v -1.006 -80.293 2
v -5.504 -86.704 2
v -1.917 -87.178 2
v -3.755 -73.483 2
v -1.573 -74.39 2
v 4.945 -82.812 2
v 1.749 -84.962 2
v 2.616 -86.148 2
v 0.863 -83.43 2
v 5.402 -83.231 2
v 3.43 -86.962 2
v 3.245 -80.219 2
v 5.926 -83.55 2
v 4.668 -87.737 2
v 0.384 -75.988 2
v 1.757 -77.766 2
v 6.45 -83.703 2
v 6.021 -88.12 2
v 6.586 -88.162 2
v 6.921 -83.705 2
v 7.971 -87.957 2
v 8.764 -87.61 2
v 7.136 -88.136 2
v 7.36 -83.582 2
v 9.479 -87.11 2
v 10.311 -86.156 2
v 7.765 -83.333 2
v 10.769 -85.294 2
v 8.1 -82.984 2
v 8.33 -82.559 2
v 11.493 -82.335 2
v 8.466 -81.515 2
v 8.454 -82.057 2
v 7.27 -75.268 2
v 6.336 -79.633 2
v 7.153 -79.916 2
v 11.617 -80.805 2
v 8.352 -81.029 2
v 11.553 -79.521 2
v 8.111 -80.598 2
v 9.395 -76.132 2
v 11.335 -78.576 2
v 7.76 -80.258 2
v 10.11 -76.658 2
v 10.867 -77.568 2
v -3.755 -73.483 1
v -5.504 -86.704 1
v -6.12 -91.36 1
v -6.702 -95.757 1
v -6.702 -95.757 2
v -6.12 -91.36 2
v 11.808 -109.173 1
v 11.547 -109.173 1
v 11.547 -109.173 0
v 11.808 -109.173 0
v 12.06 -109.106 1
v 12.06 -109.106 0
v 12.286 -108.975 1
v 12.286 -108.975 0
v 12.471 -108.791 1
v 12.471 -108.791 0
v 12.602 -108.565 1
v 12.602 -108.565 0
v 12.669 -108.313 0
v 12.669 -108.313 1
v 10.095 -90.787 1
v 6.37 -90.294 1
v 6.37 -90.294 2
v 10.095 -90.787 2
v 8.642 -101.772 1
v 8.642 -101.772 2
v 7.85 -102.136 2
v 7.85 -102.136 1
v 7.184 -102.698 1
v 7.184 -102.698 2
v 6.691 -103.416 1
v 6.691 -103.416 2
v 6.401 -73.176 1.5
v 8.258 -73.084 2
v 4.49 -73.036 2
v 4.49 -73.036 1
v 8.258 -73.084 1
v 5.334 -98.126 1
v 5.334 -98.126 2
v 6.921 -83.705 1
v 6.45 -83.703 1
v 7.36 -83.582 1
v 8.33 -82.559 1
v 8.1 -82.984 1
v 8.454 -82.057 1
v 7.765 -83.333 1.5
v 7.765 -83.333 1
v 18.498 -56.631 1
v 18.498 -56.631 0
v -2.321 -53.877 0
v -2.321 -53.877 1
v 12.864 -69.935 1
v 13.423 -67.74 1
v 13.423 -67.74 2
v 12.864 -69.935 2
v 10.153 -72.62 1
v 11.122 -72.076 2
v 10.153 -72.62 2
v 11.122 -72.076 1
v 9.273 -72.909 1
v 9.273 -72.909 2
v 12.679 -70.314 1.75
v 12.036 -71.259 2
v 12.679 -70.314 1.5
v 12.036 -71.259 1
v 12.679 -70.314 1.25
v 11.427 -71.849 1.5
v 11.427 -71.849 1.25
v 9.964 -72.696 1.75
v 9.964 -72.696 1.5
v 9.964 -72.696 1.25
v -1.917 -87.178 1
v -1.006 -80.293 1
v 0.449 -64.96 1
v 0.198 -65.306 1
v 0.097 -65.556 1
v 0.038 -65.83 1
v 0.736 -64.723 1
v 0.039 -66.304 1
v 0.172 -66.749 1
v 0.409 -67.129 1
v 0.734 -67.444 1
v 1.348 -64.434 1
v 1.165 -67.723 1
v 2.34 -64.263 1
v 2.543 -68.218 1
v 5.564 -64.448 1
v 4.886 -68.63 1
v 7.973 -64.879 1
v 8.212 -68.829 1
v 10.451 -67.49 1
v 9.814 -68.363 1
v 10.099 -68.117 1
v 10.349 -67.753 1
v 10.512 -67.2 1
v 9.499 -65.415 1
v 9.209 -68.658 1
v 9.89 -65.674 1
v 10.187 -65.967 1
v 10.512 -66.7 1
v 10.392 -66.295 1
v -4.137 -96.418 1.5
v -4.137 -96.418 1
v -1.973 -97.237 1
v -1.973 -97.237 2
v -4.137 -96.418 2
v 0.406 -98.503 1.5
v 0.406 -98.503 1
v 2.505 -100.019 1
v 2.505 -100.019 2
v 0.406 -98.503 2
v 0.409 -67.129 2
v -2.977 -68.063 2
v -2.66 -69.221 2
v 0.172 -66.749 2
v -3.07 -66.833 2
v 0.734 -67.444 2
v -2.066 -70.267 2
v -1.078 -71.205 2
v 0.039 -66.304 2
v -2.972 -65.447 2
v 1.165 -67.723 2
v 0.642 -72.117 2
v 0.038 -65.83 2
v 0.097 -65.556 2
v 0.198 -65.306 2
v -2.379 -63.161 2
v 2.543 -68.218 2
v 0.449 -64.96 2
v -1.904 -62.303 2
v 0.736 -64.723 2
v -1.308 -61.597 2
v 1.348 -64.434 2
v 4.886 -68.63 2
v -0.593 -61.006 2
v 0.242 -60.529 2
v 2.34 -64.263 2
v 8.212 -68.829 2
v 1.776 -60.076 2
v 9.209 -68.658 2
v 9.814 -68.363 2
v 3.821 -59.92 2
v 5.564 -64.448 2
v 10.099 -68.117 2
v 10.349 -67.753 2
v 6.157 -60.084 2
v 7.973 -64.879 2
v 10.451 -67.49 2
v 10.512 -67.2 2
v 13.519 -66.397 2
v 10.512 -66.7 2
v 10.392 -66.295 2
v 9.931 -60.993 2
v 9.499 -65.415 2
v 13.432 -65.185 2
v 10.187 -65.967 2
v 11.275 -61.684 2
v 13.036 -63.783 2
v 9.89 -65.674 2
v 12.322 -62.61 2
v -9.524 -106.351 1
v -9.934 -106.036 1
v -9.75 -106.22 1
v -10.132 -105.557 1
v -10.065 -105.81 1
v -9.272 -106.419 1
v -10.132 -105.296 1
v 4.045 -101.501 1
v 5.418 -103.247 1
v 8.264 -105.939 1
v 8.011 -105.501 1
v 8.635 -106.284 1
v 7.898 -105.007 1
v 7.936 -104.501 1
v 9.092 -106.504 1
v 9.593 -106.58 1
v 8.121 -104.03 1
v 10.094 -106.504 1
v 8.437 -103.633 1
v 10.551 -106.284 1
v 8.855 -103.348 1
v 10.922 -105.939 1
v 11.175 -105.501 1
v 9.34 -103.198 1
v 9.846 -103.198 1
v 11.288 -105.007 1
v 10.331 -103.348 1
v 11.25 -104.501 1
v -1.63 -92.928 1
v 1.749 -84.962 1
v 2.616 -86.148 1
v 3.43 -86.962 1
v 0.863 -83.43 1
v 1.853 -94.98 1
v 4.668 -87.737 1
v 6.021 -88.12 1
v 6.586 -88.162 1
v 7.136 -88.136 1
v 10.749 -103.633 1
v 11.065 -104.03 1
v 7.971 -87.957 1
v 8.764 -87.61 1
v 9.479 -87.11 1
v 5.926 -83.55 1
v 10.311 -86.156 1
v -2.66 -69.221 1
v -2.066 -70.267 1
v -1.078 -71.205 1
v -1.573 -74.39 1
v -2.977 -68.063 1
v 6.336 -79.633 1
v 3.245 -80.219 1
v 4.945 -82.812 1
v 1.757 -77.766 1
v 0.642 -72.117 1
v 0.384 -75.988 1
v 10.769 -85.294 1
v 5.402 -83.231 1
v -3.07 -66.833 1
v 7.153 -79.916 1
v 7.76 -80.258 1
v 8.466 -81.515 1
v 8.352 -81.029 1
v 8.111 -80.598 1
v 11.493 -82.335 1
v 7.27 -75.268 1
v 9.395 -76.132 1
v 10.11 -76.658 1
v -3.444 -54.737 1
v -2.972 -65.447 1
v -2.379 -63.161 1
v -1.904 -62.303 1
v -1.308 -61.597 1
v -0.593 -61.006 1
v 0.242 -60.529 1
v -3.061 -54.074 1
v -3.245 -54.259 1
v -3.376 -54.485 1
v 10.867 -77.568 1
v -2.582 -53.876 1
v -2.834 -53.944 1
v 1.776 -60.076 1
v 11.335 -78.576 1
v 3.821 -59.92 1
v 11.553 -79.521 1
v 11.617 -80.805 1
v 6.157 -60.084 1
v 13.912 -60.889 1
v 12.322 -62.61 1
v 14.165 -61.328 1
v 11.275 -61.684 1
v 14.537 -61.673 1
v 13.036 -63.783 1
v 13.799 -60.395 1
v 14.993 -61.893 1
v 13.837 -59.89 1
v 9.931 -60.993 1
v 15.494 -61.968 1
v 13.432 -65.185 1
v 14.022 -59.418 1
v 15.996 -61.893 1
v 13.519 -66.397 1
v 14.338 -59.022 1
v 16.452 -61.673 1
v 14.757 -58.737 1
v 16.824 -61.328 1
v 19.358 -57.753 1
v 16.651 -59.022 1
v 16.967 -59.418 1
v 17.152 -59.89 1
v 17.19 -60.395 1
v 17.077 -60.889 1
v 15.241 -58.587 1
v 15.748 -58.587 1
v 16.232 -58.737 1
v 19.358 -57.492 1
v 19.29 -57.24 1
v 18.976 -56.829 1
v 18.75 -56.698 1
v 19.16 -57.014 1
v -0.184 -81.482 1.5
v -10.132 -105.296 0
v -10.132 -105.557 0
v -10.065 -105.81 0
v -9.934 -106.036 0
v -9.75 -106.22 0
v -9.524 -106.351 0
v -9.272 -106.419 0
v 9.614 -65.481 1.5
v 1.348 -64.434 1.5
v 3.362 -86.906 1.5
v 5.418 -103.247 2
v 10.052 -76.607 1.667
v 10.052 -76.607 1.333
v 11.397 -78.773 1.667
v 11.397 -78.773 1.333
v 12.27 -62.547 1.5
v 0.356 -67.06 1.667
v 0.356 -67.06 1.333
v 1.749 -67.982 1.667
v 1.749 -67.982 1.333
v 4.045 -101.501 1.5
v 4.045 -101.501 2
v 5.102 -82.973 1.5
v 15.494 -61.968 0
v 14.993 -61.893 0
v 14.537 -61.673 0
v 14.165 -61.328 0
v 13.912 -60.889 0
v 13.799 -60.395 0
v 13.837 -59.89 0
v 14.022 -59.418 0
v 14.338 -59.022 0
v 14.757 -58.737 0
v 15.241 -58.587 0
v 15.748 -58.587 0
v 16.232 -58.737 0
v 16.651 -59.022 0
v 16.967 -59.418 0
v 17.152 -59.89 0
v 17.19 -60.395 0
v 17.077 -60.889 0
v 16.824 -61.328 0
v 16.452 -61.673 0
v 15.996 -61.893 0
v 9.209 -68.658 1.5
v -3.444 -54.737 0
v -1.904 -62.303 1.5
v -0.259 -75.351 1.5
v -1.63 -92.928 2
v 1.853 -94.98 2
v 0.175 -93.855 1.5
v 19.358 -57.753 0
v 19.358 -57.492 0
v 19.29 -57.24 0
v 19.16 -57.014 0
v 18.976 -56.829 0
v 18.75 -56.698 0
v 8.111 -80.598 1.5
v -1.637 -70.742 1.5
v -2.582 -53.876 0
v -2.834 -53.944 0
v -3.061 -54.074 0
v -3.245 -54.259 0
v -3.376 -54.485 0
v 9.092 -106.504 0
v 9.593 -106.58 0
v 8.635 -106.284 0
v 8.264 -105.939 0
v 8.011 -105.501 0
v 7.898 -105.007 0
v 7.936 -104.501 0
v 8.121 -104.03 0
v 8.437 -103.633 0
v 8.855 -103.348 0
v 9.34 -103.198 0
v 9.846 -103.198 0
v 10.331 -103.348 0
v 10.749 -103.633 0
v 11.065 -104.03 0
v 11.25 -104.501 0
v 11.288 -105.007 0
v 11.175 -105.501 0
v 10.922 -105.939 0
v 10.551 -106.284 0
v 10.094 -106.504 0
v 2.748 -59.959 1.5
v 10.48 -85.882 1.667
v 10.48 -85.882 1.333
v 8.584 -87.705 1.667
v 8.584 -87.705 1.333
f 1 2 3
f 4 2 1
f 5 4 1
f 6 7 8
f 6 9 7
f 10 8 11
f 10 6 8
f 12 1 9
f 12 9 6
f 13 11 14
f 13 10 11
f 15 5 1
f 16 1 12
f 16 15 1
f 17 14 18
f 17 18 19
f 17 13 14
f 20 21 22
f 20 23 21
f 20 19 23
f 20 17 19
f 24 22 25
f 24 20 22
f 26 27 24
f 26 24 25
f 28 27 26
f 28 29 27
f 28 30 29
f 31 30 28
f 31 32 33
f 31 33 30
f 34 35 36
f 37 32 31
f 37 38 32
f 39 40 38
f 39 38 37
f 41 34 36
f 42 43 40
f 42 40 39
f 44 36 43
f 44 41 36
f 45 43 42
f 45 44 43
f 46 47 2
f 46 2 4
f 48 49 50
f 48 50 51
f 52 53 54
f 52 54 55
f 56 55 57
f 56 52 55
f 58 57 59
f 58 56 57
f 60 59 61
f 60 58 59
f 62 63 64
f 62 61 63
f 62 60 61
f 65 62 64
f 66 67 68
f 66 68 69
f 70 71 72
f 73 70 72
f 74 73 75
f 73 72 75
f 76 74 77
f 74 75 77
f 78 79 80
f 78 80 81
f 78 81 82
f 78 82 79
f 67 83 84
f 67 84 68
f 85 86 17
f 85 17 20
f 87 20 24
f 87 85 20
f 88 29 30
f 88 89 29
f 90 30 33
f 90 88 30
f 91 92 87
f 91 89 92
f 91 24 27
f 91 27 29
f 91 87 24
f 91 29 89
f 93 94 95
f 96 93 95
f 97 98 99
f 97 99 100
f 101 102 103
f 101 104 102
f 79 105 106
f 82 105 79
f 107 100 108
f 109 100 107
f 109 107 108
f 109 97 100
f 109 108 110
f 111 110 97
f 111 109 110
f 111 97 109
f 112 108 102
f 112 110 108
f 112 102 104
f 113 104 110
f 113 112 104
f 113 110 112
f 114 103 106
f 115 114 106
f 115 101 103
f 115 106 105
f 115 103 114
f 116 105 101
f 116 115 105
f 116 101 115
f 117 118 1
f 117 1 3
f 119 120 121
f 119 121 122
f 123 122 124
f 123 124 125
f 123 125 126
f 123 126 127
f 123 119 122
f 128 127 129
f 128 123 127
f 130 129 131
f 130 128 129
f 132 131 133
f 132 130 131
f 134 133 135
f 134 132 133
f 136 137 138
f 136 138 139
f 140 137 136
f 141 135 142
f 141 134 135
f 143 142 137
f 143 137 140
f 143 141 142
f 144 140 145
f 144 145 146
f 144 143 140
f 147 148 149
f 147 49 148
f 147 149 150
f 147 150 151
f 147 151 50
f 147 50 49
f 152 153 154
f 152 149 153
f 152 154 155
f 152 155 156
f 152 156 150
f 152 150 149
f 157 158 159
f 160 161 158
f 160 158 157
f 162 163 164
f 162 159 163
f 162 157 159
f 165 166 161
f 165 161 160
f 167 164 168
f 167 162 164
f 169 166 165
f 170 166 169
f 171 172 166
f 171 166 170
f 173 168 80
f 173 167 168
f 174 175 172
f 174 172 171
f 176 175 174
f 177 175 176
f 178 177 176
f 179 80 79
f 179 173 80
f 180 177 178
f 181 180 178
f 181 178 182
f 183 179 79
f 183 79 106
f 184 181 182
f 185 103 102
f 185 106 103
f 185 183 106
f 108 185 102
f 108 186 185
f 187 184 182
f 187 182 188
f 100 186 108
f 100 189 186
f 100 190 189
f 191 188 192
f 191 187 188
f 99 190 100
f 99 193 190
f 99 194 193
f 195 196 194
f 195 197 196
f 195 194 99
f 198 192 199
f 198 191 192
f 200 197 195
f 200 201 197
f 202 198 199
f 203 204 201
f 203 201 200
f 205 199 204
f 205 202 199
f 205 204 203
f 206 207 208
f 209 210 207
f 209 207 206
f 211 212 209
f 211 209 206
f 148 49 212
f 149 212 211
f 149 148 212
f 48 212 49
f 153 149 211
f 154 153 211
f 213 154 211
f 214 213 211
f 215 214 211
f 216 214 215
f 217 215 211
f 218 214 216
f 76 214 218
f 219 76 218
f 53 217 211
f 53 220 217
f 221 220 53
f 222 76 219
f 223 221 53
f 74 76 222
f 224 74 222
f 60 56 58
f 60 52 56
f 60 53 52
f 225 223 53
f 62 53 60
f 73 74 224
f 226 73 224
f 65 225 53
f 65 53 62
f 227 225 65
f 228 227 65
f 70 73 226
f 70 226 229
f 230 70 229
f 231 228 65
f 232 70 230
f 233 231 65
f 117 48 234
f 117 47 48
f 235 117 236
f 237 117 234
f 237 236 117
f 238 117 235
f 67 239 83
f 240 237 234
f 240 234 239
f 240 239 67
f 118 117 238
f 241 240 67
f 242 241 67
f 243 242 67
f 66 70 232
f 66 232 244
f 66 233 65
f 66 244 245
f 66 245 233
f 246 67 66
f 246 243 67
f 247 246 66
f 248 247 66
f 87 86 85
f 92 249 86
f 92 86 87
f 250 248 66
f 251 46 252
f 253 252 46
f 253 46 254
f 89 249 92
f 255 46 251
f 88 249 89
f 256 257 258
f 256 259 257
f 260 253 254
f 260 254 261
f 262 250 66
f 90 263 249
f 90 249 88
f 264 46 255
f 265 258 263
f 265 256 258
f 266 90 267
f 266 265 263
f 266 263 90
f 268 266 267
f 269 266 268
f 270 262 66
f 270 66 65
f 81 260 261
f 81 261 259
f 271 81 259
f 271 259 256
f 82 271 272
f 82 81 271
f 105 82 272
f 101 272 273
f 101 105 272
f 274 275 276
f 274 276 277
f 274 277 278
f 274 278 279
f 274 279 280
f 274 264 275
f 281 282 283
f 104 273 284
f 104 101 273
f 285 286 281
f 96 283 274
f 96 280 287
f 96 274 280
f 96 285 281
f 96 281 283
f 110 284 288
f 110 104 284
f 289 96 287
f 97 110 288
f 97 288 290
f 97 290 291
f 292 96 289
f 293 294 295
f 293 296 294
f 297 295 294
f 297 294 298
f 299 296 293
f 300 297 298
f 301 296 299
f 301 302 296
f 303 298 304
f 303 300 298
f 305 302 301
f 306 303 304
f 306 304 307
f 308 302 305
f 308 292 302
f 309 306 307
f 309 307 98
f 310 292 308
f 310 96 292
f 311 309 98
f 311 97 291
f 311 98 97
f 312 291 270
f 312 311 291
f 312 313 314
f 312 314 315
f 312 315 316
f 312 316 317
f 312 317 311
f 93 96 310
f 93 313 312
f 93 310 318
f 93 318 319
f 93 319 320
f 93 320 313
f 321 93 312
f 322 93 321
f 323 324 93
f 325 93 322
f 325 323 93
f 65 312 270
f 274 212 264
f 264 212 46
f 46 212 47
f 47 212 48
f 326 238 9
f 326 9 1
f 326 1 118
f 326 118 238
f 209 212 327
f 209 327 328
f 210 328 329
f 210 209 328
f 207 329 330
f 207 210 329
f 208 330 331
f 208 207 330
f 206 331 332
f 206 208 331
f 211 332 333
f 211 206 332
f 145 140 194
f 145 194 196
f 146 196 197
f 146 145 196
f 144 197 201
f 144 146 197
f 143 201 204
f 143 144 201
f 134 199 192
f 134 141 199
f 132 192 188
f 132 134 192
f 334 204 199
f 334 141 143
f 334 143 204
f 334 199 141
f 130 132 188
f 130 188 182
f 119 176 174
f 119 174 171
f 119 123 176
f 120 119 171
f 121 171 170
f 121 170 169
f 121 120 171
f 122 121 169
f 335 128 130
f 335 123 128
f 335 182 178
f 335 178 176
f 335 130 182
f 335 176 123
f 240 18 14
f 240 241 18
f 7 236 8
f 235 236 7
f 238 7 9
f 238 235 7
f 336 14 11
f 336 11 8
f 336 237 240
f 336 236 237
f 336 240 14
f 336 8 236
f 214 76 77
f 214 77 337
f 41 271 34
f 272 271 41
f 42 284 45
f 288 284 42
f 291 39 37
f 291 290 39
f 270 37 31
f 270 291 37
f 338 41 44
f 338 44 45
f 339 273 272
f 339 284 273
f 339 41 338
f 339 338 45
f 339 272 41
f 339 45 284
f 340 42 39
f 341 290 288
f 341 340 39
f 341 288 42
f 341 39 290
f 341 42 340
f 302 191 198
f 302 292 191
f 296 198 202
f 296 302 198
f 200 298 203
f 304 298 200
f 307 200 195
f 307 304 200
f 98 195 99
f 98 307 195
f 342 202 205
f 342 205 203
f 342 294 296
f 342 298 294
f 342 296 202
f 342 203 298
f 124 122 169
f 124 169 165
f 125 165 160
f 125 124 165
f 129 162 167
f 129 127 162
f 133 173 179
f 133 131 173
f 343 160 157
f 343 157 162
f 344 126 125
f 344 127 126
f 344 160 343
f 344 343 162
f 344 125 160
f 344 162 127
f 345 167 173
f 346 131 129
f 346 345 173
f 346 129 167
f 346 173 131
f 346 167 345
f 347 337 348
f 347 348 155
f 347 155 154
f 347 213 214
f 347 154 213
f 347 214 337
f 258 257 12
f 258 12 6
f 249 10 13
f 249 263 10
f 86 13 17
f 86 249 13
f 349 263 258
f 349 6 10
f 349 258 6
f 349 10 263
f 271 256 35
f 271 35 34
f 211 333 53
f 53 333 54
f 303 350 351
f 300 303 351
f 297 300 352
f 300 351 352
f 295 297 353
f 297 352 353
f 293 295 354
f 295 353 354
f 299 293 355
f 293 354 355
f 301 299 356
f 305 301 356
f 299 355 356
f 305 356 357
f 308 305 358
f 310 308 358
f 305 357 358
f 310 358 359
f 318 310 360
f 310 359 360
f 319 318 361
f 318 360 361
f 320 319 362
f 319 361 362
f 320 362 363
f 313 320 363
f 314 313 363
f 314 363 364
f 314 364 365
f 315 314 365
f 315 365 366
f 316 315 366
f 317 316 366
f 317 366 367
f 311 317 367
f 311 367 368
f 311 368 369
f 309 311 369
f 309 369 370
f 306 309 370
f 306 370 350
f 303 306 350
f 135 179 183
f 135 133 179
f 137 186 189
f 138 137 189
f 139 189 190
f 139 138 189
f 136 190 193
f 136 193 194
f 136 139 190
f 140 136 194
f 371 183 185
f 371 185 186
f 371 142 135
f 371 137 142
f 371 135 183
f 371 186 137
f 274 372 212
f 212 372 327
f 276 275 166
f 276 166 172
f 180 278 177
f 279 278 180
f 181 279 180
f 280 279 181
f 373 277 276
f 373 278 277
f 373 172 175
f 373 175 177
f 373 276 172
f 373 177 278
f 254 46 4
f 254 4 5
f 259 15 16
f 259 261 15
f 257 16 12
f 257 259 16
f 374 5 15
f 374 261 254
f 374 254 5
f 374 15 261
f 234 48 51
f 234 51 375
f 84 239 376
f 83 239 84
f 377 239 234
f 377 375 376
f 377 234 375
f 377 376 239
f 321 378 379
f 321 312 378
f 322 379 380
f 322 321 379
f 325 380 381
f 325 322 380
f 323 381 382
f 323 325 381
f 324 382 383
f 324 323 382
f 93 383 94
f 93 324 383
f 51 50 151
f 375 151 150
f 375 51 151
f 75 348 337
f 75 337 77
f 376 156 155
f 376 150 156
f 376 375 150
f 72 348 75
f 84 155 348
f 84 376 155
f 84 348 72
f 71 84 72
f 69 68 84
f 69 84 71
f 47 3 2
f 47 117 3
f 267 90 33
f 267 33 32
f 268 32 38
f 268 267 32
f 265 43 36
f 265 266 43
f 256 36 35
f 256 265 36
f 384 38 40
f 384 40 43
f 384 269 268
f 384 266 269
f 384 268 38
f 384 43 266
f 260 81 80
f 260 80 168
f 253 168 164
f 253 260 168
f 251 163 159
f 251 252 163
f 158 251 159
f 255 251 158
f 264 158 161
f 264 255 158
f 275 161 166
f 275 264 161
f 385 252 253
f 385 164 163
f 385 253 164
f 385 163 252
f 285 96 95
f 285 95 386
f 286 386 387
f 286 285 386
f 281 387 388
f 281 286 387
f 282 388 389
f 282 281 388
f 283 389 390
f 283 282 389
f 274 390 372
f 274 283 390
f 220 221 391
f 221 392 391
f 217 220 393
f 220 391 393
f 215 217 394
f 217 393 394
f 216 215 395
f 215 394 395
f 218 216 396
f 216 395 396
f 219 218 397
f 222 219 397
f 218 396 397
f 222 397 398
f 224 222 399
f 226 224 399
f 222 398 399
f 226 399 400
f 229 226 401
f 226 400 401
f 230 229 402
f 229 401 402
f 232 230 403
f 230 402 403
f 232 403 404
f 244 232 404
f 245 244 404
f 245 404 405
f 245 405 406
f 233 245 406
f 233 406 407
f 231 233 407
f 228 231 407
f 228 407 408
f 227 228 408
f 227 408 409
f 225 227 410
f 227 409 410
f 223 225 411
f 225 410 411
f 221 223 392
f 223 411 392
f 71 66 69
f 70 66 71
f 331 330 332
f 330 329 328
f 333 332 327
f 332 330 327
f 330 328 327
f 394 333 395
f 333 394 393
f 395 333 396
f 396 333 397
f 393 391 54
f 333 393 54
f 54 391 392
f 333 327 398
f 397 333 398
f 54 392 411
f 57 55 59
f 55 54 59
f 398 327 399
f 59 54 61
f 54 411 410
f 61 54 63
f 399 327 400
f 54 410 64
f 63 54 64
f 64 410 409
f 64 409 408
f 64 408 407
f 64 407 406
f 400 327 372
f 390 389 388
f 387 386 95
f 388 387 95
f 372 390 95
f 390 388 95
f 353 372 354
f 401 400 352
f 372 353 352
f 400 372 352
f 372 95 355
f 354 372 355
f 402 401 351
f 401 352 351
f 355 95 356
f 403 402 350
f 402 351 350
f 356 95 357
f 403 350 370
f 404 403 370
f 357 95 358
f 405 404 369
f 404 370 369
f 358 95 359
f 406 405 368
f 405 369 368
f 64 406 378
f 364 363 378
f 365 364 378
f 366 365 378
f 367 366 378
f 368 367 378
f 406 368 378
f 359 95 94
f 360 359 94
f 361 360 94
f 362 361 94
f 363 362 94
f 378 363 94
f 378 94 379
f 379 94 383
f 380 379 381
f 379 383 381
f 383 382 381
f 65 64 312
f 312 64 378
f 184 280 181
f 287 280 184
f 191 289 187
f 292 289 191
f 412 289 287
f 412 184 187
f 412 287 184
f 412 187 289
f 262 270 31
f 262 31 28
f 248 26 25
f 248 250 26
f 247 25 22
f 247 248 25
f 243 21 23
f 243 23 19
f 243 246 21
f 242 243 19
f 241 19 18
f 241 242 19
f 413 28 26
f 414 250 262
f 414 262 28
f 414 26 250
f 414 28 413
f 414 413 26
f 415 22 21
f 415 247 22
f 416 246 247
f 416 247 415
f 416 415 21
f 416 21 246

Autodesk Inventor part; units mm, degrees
ref_plane "YZ Plane" through (0, 0, 0) normal (1, 0, 0) x (0, 1, 0)
ref_plane "XZ Plane" through (0, 0, 0) normal (0, 1, 0) x (-1, 0, 0)
ref_plane "XY Plane" through (0, 0, 0) normal (0, 0, 1) x (1, 0, 0)
ref_plane "Work Plane1" through (6.35, -3.5793, 0) normal (0, 0, 1) x (0.9913632, -0.1311451, 0)
sketch "Sketch1" plane through (6.35, -3.5793, 0) normal (0, 0, 1) x (0.9913632, -0.1311451, 0)
  line L0 (9.4349, -35.1273) -> (9.1077, -32.6537) projected
  line L1 (9.1077, -32.6537) -> (11.809, -32.2963) projected
  line L2 (11.809, -32.2963) -> (11.8581, -32.8269) projected
  line L3 (11.8581, -32.8269) -> (12.0044, -33.5342) projected
  spline S0 degree 2 poles (12.0044, -33.5342) (12.2496, -34.5127) (12.9939, -35.3621) (13.7166, -35.5719) knots 0 0 0 1 2 2 2 projected
  line L4 (13.7166, -35.5719) -> (14.274, -35.6456) projected
  line L5 (14.274, -35.6456) -> (14.6409, -38.4193) projected
  line L6 (14.6409, -38.4193) -> (0.7619, -40.2553) projected
  line L7 (0.7619, -40.2553) -> (0.2443, -36.3431) projected
  line L8 (0.2443, -36.3431) -> (9.4349, -35.1273) projected
  line L9 (-0.9482, -27.3284) -> (-1.4726, -23.3645) projected
  line L10 (-1.4726, -23.3645) -> (12.4065, -21.5284) projected
  line L11 (12.4065, -21.5284) -> (13.1225, -26.9414) projected
  spline S1 degree 2 poles (13.1225, -26.9414) (13.3717, -28.825) (11.9849, -30.9988) (10.2534, -31.5228) knots 0 0 0 1 2 2 2 projected
  spline S2 degree 2 poles (10.2534, -31.5228) (9.6848, -31.6822) (9.2839, -31.7563) (9.1286, -31.7769) knots 0 0 0 1 2 2 2 projected
  spline S3 degree 2 poles (9.1286, -31.7769) (7.1725, -32.0356) (4.658, -29.904) (4.3718, -27.7409) knots 0 0 0 1 2 2 2 projected
  line L12 (4.3718, -27.7409) -> (4.2267, -26.6439) projected
  line L13 (4.2267, -26.6439) -> (-0.9482, -27.3284) projected
  line L14 (-4.2533, -2.344) -> (-4.7325, 1.2784) projected
  line L15 (-4.7325, 1.2784) -> (9.1465, 3.1145) projected
  line L16 (9.1465, 3.1145) -> (9.8448, -2.1639) projected
  line L17 (9.8448, -2.1639) -> (2.0845, -4.5596) projected
  line L18 (2.0845, -4.5596) -> (10.2008, -4.8549) projected
  line L19 (10.2008, -4.8549) -> (10.9018, -10.154) projected
  line L20 (10.9018, -10.154) -> (-2.9773, -11.99) projected
  line L21 (-2.9773, -11.99) -> (-3.4565, -8.3676) projected
  line L22 (-3.4565, -8.3676) -> (6.1067, -7.1025) projected
  line L23 (6.1067, -7.1025) -> (-3.6564, -6.8565) projected
  line L24 (-3.6564, -6.8565) -> (-4.0562, -3.8344) projected
  line L25 (-4.0562, -3.8344) -> (5.3099, -1.0789) projected
  line L26 (5.3099, -1.0789) -> (-4.2533, -2.344) projected
  line L27 (-6.2934, 13.0772) -> (-6.8178, 17.0412) projected
  line L28 (-6.8178, 17.0412) -> (7.0613, 18.8772) projected
  line L29 (7.0613, 18.8772) -> (7.7774, 13.4643) projected
  spline S4 degree 2 poles (7.7774, 13.4643) (8.0266, 11.5806) (6.6397, 9.4068) (4.9082, 8.8829) knots 0 0 0 1 2 2 2 projected
  spline S5 degree 2 poles (4.9082, 8.8829) (4.3396, 8.7234) (3.9387, 8.6493) (3.7835, 8.6288) knots 0 0 0 1 2 2 2 projected
  spline S6 degree 2 poles (3.7835, 8.6288) (1.8273, 8.37) (-0.6872, 10.5016) (-0.9734, 12.6647) knots 0 0 0 1 2 2 2 projected
  line L30 (-0.9734, 12.6647) -> (-1.1185, 13.7618) projected
  line L31 (-1.1185, 13.7618) -> (-6.2934, 13.0772) projected
  line L32 (-8.8852, 32.6694) -> (-9.4096, 36.6333) projected
  line L33 (-9.4096, 36.6333) -> (4.4695, 38.4694) projected
  line L34 (4.4695, 38.4694) -> (5.1856, 33.0564) projected
  spline S7 degree 2 poles (5.1856, 33.0564) (5.4348, 31.1728) (4.0479, 28.999) (2.3164, 28.475) knots 0 0 0 1 2 2 2 projected
  spline S8 degree 2 poles (2.3164, 28.475) (1.7478, 28.3156) (1.3469, 28.2415) (1.1917, 28.2209) knots 0 0 0 1 2 2 2 projected
  spline S9 degree 2 poles (1.1917, 28.2209) (-0.7645, 27.9622) (-3.279, 30.0938) (-3.5652, 32.2569) knots 0 0 0 1 2 2 2 projected
  line L35 (-3.5652, 32.2569) -> (-3.7103, 33.3539) projected
  line L36 (-3.7103, 33.3539) -> (-8.8852, 32.6694) projected
  line L37 (-6.9369, 17.9416) -> (-8.0596, 26.4284) projected
  line L38 (-8.0596, 26.4284) -> (5.8195, 28.2645) projected
  line L39 (5.8195, 28.2645) -> (6.923, 19.9225) projected
  line L40 (6.923, 19.9225) -> (3.7146, 19.4981) projected
  line L41 (3.7146, 19.4981) -> (3.1354, 23.8761) projected
  line L42 (3.1354, 23.8761) -> (1.0655, 23.6022) projected
  line L43 (1.0655, 23.6022) -> (1.609, 19.4934) projected
  line L44 (1.609, 19.4934) -> (-1.4649, 19.0867) projected
  line L45 (-1.4649, 19.0867) -> (-2.0084, 23.1956) projected
  line L46 (-2.0084, 23.1956) -> (-4.3268, 22.8889) projected
  line L47 (-4.3268, 22.8889) -> (-3.7284, 18.366) projected
  line L48 (-3.7284, 18.366) -> (-6.9369, 17.9416) projected
  line L49 (-2.3023, -17.0925) -> (-2.7993, -13.3355) projected
  line L50 (-2.7993, -13.3355) -> (11.0798, -11.4995) projected
  line L51 (11.0798, -11.4995) -> (11.5768, -15.2564) projected
  line L52 (11.5768, -15.2564) -> (4.8598, -16.145) projected
  line L53 (4.8598, -16.145) -> (8.406, -17.3187) projected
  line L54 (8.406, -17.3187) -> (8.9249, -21.2413) projected
  line L55 (8.9249, -21.2413) -> (4.2393, -19.0178) projected
  line L56 (4.2393, -19.0178) -> (-1.5205, -23.0022) projected
  line L57 (-1.5205, -23.0022) -> (-2.0504, -18.9968) projected
  line L58 (-2.0504, -18.9968) -> (1.2432, -16.9078) projected
  line L59 (1.2432, -16.9078) -> (0.4818, -16.7242) projected
  line L60 (0.4818, -16.7242) -> (-2.3023, -17.0925) projected
  line L61 (20, -51) -> (-3, -51)
  line L62 (-3, -51) -> (-3, -104)
  line L63 (-3, -104) -> (20, -104)
  line L64 (20, -104) -> (20, -51)
  circle A0 centre (16.3103, -49.711) radius 1.95 projected
  circle A1 centre (-20.0656, -79.7409) radius 1.95 projected
  circle A2 centre (-37.1145, 49.1363) radius 1.95 projected
  line L65 (11.0027, -81.1536) -> (12.4808, -77.5789) projected
  line L66 (7.1679, -81.6609) -> (11.0027, -81.1536) projected
  line L67 (4.8111, -78.5935) -> (7.1679, -81.6609) projected
  line L68 (6.2892, -75.0188) -> (4.8111, -78.5935) projected
  line L69 (10.124, -74.5115) -> (6.2892, -75.0188) projected
  line L70 (12.4808, -77.5789) -> (10.124, -74.5115) projected
  line L71 (2.8138, -48.7477) -> (1.3358, -52.3224) projected
  line L72 (6.6487, -48.2404) -> (2.8138, -48.7477) projected
  line L73 (9.0054, -51.3078) -> (6.6487, -48.2404) projected
  line L74 (7.5273, -54.8825) -> (9.0054, -51.3078) projected
  line L75 (3.6925, -55.3898) -> (7.5273, -54.8825) projected
  line L76 (1.3358, -52.3224) -> (3.6925, -55.3898) projected
  line L77 (9.7896, -71.9835) -> (11.2677, -68.4088) projected
  line L78 (5.9548, -72.4908) -> (9.7896, -71.9835) projected
  line L79 (3.598, -69.4234) -> (5.9548, -72.4908) projected
  line L80 (5.0761, -65.8487) -> (3.598, -69.4234) projected
  line L81 (8.9109, -65.3414) -> (5.0761, -65.8487) projected
  line L82 (11.2677, -68.4088) -> (8.9109, -65.3414) projected
  line L83 (8.5514, -92.1198) -> (7.0733, -95.6945) projected
  line L84 (12.3863, -91.6125) -> (8.5514, -92.1198) projected
  line L85 (14.743, -94.6799) -> (12.3863, -91.6125) projected
  line L86 (13.2649, -98.2547) -> (14.743, -94.6799) projected
  line L87 (9.4301, -98.762) -> (13.2649, -98.2547) projected
  line L88 (7.0733, -95.6945) -> (9.4301, -98.762) projected
  circle A3 centre (-24, -50) radius 1.95 projected
  line L89 (-23.7833, -80.2327) -> (-27.715, -50.5115) projected
  arc A4 (-23.7833, -80.2327) -> (-21.1747, -83.3231) centre (-20.0656, -79.7409) ccw projected
  line L90 (7.3797, -99.9093) -> (-21.1747, -83.3231) projected
  arc A5 (7.3797, -99.9093) -> (7.8548, -100.0043) centre (7.7565, -99.2608) ccw projected
  line L91 (25.6777, -97.6465) -> (7.8548, -100.0043) projected
  arc A6 (25.6777, -97.6465) -> (26.3228, -96.8047) centre (25.5793, -96.903) ccw projected
  line L92 (8.768, 35.8971) -> (26.3228, -96.8047) projected
  arc A7 (8.768, 35.8971) -> (5.0328, 42.3573) centre (-0.8978, 34.6184) ccw projected
  line L93 (-5.2293, 50.2216) -> (5.0328, 42.3573) projected
  arc A8 (-5.2293, 50.2216) -> (-12.4386, 52.1485) centre (-11.1599, 42.4827) ccw projected
  line L94 (-13.3095, 52.0332) -> (-12.4386, 52.1485) projected
  line L95 (-37.6265, 52.8512) -> (-13.3095, 52.0332) projected
  arc A9 (-37.6265, 52.8512) -> (-40.8346, 48.6639) centre (-37.1145, 49.1363) ccw projected
  line L96 (-26.3408, 0.1259) -> (-40.8346, 48.6639) projected
  line L97 (-27.715, -50.5115) -> (-26.3408, 0.1259) projected
  circle A10 centre (22.2118, -94.3224) radius 1.95 projected
  point P0 (-6.7645, 2.7156)
  point P1 (1.0219, -104)
  point P2 (20, -103)
  dimension "d0" = 23
  dimension "d1" = 53
extrude "Extrusion1" add sketch "Sketch1" along normal blind 1 contours L64 L91 A5 L90 L62 L61 L71 L76 L75 L74 L73 A0 | A0 L61 | L64 L63 L62 L90 A5 L91 | L73 L74 L75 L76 L71 L61 | L66 L67 L68 L69 L70 L65 | L78 L79 L80 L81 L82 L77 | L84 L85 L86 L87 L88 L83 picked at (16.6806, -51.1045)
fillet "Fillet1" radius 1 4 edges at (-3.3125, -53.7454, 0.5) (-10.2632, -106.2877, 0.5) (12.5381, -109.304, 0.5) (19.4888, -56.7617, 0.5)
sketch "Sketch2" plane through (6.35, -3.5793, 1) normal (0, 0, 1) x (0.9913632, -0.1311451, 0)
  line L0 (15.4266, -55.1181) -> (15.4266, -70.8864) construction
  line L1 (15.4266, -70.8864) -> (9.1495, -70.8864) construction
  line L2 (9.1495, -70.8864) -> (9.1495, -55.1181) construction
  line L3 (9.1495, -55.1181) -> (15.4266, -55.1181) construction
  spline S0 degree 2 poles (7.2188, -56.0421) (11.777, -56.0421) (15.4266, -59.3222) (15.4266, -62.6792) knots 0 0 0 1 2 2 2
  spline S1 degree 2 poles (15.4266, -62.6792) (15.4266, -64.2962) (14.6259, -66.3597) (13.3477, -67.6687) (11.9464, -68.4232) (11.007, -68.6542) knots 0 0 0 1 2 3 4 4 4
  spline S2 degree 2 poles (11.007, -68.6542) (9.2207, -69.1008) (7.2649, -69.1008) knots 0 0 0 1 1 1
  spline S3 degree 2 poles (7.2649, -69.1008) (2.9069, -69.1008) (-1.1277, -66.1595) (-1.1277, -62.556) knots 0 0 0 1 2 2 2
  spline S4 degree 2 poles (-1.1277, -62.556) (-1.1277, -60.5387) (0.1658, -58.0594) (1.4132, -57.2586) knots 0 0 0 1 2 2 2
  spline S5 degree 2 poles (1.4132, -57.2586) (2.2909, -56.6889) (5.3554, -56.0421) (7.2188, -56.0421) knots 0 0 0 1 2 2 2
  spline S6 degree 2 poles (7.2034, -60.4463) (4.1389, -60.4463) (1.906, -61.5243) (1.906, -62.5407) knots 0 0 0 1 2 2 2
  spline S7 degree 2 poles (1.906, -62.5407) (1.906, -63.2182) (2.8607, -64.2192) (4.9088, -64.6812) (7.0802, -64.6812) knots 0 0 0 1 2 3 3 3
  spline S8 degree 2 poles (7.0802, -64.6812) (10.2678, -64.6812) (12.47, -63.6032) (12.47, -62.5253) knots 0 0 0 1 2 2 2
  spline S9 degree 2 poles (12.47, -62.5253) (12.47, -61.4319) (10.237, -60.4463) (7.2034, -60.4463) knots 0 0 0 1 2 2 2
  line L4 (-0.8505, -83.9612) -> (-0.8505, -70.6253)
  spline S10 degree 2 poles (-0.8505, -70.6253) (1.1206, -70.8563) (4.6008, -73.1817) (6.9724, -76.3847) knots 0 0 0 1 2 2 2
  spline S11 degree 2 poles (6.9724, -76.3847) (8.4199, -78.3251) (9.929, -79.4184) (10.6066, -79.4184) knots 0 0 0 1 2 2 2
  spline S12 degree 2 poles (10.6066, -79.4184) (11.3458, -79.4184) (12.3776, -78.3405) (12.3776, -77.5243) knots 0 0 0 1 2 2 2
  spline S13 degree 2 poles (12.3776, -77.5243) (12.3776, -76.6619) (11.315, -75.584) (9.9598, -75.3992) knots 0 0 0 1 2 2 2
  line L5 (9.9598, -75.3992) -> (10.314, -70.9487)
  spline S14 degree 2 poles (10.314, -70.9487) (12.1928, -71.2105) (14.3025, -72.6119) (15.4266, -75.1528) (15.4266, -77.4011) knots 0 0 0 1 2 3 3 3
  spline S15 degree 2 poles (15.4266, -77.4011) (15.4266, -79.7418) (14.3487, -82.3597) (12.1466, -83.8535) (10.7606, -83.8535) knots 0 0 0 1 2 3 3 3
  spline S16 degree 2 poles (10.7606, -83.8535) (9.2977, -83.8535) (6.6336, -82.1441) (5.032, -79.8804) knots 0 0 0 1 2 2 2
  spline S17 degree 2 poles (5.032, -79.8804) (4.1081, -78.5407) (3.3689, -77.6321) (2.7683, -77.0161) knots 0 0 0 1 2 2 2
  line L6 (2.7683, -77.0161) -> (2.7683, -83.9612)
  line L7 (2.7683, -83.9612) -> (-0.8505, -83.9612)
  line L8 (15.1495, -85.9632) -> (15.1495, -98.9295)
  line L9 (15.1495, -98.9295) -> (12.1466, -98.9295)
  spline S18 degree 2 poles (12.1466, -98.9295) (10.622, -97.2355) (8.8357, -96.1114) knots 0 0 0 1 1 1
  spline S19 degree 2 poles (8.8357, -96.1114) (6.6798, -94.7408) (4.0311, -93.9401) knots 0 0 0 1 1 1
  spline S20 degree 2 poles (4.0311, -93.9401) (1.9675, -93.3087) (-0.8505, -93.0931) knots 0 0 0 1 1 1
  line L10 (-0.8505, -93.0931) -> (-0.8505, -88.6581)
  spline S21 degree 2 poles (-0.8505, -88.6581) (3.0609, -89.1817) (8.3737, -91.43) (11.392, -93.8631) knots 0 0 0 1 2 2 2
  line L11 (11.392, -93.8631) -> (11.392, -85.9632)
  line L12 (11.392, -85.9632) -> (15.1495, -85.9632)
  point P0 (-6.7645, 2.7156)
extrude "Extrusion2" add sketch "Sketch2" along normal blind 1
sketch "Sketch3" plane through (6.35, -3.5793, 1) normal (0, 0, 1) x (0.9913632, -0.1311451, 0)
  arc A0 (19.4855, -94.683) -> (21.161, -96.8637) centre (22.2118, -94.3224) ccw construction
  arc A1 (20.5363, -92.1417) -> (19.4855, -94.683) centre (22.2118, -94.3224) ccw construction
  arc A2 (23.2626, -91.781) -> (20.5363, -92.1417) centre (22.2118, -94.3224) ccw construction
  arc A3 (24.938, -93.9617) -> (23.2626, -91.781) centre (22.2118, -94.3224) ccw construction
  arc A4 (23.8872, -96.503) -> (24.938, -93.9617) centre (22.2118, -94.3224) ccw construction
  arc A5 (21.161, -96.8637) -> (23.8872, -96.503) centre (22.2118, -94.3224) ccw construction
  arc A6 (21.0223, -95.2362) -> (20.7342, -94.0639) centre (22.2118, -94.3224) ccw construction
  arc A7 (20.7342, -94.0639) -> (21.0223, -95.2362) centre (22.2118, -94.3224) ccw construction
  arc A8 (14.6348, -47.5303) -> (13.584, -50.0717) centre (16.3103, -49.711) ccw construction
  arc A9 (17.361, -47.1697) -> (14.6348, -47.5303) centre (16.3103, -49.711) ccw construction
  arc A10 (19.0365, -49.3504) -> (17.361, -47.1697) centre (16.3103, -49.711) ccw construction
  arc A11 (17.9857, -51.8917) -> (19.0365, -49.3504) centre (16.3103, -49.711) ccw construction
  arc A12 (15.2595, -52.2523) -> (17.9857, -51.8917) centre (16.3103, -49.711) ccw construction
  arc A13 (13.584, -50.0717) -> (15.2595, -52.2523) centre (16.3103, -49.711) ccw construction
  arc A14 (14.9241, -49.1379) -> (15.7953, -48.3022) centre (16.3103, -49.711) ccw construction
  arc A15 (15.7953, -48.3022) -> (14.9241, -49.1379) centre (16.3103, -49.711) ccw construction
  line L0 (20, -103) -> (20, -52) projected
  point P0 (-6.7645, 2.7156)
  point P1 (16.5, -55)
  point P2 (16.5, -100)
  point P3 (20, -77.5)
  dimension "d14" = 45
  dimension "d15" = 3.5
  dimension "d16" = 22.5
hole "Hole1" at (15.4945, -60.2682, 1) at (9.593, -104.8795, 1) direction (0, 0, -1) diameter 3.4 end through all clearance for "Socket Head Cap Screw" size "M3" standard "Ansi Metric M Profile"
sketch "Sketch4" plane through (6.35, -3.5793, 1) normal (0, 0, 1) x (0.9913632, -0.1311451, 0)
  circle A0 centre (16.5, -55) radius 1.7 projected
  circle A1 centre (16.5, -100) radius 1.7 projected
  arc A2 (20, -52) -> (19, -51) centre (19, -52) ccw projected
  line L0 (19, -51) -> (-2, -51) projected
  arc A3 (-2, -51) -> (-3, -52) centre (-2, -52) ccw projected
  line L1 (-3, -52) -> (-3, -103) projected
  arc A4 (-3, -103) -> (-2, -104) centre (-2, -103) ccw projected
  line L2 (-2, -104) -> (19, -104) projected
  arc A5 (19, -104) -> (20, -103) centre (19, -103) ccw projected
  line L3 (20, -103) -> (20, -52) projected
  line L4 (15.1495, -98.9295) -> (12.1466, -98.9295) projected
  line L5 (-0.8505, -93.0931) -> (-0.8505, -88.6581) projected
  line L6 (11.392, -93.8631) -> (11.392, -85.9632) projected
  line L7 (11.392, -85.9632) -> (15.1495, -85.9632) projected
  line L8 (15.1495, -85.9632) -> (15.1495, -98.9295) projected
  line L9 (9.9598, -75.3992) -> (10.314, -70.9487) projected
  line L10 (2.7683, -77.0161) -> (2.7683, -83.9612) projected
  line L11 (2.7683, -83.9612) -> (-0.8505, -83.9612) projected
  line L12 (-0.8505, -83.9612) -> (-0.8505, -70.6253) projected
  point P0 (-6.7645, 2.7156)
hole "Hole2" at (9.593, -104.8795, 1) direction (0, 0, 1) diameter 3.2 end through all counterbore diameter 6.5 counterbore depth 3 clearance for "Socket Head Cap Screw" size "M3" standard "Ansi Metric M Profile"
properties part number "ID Plate"
